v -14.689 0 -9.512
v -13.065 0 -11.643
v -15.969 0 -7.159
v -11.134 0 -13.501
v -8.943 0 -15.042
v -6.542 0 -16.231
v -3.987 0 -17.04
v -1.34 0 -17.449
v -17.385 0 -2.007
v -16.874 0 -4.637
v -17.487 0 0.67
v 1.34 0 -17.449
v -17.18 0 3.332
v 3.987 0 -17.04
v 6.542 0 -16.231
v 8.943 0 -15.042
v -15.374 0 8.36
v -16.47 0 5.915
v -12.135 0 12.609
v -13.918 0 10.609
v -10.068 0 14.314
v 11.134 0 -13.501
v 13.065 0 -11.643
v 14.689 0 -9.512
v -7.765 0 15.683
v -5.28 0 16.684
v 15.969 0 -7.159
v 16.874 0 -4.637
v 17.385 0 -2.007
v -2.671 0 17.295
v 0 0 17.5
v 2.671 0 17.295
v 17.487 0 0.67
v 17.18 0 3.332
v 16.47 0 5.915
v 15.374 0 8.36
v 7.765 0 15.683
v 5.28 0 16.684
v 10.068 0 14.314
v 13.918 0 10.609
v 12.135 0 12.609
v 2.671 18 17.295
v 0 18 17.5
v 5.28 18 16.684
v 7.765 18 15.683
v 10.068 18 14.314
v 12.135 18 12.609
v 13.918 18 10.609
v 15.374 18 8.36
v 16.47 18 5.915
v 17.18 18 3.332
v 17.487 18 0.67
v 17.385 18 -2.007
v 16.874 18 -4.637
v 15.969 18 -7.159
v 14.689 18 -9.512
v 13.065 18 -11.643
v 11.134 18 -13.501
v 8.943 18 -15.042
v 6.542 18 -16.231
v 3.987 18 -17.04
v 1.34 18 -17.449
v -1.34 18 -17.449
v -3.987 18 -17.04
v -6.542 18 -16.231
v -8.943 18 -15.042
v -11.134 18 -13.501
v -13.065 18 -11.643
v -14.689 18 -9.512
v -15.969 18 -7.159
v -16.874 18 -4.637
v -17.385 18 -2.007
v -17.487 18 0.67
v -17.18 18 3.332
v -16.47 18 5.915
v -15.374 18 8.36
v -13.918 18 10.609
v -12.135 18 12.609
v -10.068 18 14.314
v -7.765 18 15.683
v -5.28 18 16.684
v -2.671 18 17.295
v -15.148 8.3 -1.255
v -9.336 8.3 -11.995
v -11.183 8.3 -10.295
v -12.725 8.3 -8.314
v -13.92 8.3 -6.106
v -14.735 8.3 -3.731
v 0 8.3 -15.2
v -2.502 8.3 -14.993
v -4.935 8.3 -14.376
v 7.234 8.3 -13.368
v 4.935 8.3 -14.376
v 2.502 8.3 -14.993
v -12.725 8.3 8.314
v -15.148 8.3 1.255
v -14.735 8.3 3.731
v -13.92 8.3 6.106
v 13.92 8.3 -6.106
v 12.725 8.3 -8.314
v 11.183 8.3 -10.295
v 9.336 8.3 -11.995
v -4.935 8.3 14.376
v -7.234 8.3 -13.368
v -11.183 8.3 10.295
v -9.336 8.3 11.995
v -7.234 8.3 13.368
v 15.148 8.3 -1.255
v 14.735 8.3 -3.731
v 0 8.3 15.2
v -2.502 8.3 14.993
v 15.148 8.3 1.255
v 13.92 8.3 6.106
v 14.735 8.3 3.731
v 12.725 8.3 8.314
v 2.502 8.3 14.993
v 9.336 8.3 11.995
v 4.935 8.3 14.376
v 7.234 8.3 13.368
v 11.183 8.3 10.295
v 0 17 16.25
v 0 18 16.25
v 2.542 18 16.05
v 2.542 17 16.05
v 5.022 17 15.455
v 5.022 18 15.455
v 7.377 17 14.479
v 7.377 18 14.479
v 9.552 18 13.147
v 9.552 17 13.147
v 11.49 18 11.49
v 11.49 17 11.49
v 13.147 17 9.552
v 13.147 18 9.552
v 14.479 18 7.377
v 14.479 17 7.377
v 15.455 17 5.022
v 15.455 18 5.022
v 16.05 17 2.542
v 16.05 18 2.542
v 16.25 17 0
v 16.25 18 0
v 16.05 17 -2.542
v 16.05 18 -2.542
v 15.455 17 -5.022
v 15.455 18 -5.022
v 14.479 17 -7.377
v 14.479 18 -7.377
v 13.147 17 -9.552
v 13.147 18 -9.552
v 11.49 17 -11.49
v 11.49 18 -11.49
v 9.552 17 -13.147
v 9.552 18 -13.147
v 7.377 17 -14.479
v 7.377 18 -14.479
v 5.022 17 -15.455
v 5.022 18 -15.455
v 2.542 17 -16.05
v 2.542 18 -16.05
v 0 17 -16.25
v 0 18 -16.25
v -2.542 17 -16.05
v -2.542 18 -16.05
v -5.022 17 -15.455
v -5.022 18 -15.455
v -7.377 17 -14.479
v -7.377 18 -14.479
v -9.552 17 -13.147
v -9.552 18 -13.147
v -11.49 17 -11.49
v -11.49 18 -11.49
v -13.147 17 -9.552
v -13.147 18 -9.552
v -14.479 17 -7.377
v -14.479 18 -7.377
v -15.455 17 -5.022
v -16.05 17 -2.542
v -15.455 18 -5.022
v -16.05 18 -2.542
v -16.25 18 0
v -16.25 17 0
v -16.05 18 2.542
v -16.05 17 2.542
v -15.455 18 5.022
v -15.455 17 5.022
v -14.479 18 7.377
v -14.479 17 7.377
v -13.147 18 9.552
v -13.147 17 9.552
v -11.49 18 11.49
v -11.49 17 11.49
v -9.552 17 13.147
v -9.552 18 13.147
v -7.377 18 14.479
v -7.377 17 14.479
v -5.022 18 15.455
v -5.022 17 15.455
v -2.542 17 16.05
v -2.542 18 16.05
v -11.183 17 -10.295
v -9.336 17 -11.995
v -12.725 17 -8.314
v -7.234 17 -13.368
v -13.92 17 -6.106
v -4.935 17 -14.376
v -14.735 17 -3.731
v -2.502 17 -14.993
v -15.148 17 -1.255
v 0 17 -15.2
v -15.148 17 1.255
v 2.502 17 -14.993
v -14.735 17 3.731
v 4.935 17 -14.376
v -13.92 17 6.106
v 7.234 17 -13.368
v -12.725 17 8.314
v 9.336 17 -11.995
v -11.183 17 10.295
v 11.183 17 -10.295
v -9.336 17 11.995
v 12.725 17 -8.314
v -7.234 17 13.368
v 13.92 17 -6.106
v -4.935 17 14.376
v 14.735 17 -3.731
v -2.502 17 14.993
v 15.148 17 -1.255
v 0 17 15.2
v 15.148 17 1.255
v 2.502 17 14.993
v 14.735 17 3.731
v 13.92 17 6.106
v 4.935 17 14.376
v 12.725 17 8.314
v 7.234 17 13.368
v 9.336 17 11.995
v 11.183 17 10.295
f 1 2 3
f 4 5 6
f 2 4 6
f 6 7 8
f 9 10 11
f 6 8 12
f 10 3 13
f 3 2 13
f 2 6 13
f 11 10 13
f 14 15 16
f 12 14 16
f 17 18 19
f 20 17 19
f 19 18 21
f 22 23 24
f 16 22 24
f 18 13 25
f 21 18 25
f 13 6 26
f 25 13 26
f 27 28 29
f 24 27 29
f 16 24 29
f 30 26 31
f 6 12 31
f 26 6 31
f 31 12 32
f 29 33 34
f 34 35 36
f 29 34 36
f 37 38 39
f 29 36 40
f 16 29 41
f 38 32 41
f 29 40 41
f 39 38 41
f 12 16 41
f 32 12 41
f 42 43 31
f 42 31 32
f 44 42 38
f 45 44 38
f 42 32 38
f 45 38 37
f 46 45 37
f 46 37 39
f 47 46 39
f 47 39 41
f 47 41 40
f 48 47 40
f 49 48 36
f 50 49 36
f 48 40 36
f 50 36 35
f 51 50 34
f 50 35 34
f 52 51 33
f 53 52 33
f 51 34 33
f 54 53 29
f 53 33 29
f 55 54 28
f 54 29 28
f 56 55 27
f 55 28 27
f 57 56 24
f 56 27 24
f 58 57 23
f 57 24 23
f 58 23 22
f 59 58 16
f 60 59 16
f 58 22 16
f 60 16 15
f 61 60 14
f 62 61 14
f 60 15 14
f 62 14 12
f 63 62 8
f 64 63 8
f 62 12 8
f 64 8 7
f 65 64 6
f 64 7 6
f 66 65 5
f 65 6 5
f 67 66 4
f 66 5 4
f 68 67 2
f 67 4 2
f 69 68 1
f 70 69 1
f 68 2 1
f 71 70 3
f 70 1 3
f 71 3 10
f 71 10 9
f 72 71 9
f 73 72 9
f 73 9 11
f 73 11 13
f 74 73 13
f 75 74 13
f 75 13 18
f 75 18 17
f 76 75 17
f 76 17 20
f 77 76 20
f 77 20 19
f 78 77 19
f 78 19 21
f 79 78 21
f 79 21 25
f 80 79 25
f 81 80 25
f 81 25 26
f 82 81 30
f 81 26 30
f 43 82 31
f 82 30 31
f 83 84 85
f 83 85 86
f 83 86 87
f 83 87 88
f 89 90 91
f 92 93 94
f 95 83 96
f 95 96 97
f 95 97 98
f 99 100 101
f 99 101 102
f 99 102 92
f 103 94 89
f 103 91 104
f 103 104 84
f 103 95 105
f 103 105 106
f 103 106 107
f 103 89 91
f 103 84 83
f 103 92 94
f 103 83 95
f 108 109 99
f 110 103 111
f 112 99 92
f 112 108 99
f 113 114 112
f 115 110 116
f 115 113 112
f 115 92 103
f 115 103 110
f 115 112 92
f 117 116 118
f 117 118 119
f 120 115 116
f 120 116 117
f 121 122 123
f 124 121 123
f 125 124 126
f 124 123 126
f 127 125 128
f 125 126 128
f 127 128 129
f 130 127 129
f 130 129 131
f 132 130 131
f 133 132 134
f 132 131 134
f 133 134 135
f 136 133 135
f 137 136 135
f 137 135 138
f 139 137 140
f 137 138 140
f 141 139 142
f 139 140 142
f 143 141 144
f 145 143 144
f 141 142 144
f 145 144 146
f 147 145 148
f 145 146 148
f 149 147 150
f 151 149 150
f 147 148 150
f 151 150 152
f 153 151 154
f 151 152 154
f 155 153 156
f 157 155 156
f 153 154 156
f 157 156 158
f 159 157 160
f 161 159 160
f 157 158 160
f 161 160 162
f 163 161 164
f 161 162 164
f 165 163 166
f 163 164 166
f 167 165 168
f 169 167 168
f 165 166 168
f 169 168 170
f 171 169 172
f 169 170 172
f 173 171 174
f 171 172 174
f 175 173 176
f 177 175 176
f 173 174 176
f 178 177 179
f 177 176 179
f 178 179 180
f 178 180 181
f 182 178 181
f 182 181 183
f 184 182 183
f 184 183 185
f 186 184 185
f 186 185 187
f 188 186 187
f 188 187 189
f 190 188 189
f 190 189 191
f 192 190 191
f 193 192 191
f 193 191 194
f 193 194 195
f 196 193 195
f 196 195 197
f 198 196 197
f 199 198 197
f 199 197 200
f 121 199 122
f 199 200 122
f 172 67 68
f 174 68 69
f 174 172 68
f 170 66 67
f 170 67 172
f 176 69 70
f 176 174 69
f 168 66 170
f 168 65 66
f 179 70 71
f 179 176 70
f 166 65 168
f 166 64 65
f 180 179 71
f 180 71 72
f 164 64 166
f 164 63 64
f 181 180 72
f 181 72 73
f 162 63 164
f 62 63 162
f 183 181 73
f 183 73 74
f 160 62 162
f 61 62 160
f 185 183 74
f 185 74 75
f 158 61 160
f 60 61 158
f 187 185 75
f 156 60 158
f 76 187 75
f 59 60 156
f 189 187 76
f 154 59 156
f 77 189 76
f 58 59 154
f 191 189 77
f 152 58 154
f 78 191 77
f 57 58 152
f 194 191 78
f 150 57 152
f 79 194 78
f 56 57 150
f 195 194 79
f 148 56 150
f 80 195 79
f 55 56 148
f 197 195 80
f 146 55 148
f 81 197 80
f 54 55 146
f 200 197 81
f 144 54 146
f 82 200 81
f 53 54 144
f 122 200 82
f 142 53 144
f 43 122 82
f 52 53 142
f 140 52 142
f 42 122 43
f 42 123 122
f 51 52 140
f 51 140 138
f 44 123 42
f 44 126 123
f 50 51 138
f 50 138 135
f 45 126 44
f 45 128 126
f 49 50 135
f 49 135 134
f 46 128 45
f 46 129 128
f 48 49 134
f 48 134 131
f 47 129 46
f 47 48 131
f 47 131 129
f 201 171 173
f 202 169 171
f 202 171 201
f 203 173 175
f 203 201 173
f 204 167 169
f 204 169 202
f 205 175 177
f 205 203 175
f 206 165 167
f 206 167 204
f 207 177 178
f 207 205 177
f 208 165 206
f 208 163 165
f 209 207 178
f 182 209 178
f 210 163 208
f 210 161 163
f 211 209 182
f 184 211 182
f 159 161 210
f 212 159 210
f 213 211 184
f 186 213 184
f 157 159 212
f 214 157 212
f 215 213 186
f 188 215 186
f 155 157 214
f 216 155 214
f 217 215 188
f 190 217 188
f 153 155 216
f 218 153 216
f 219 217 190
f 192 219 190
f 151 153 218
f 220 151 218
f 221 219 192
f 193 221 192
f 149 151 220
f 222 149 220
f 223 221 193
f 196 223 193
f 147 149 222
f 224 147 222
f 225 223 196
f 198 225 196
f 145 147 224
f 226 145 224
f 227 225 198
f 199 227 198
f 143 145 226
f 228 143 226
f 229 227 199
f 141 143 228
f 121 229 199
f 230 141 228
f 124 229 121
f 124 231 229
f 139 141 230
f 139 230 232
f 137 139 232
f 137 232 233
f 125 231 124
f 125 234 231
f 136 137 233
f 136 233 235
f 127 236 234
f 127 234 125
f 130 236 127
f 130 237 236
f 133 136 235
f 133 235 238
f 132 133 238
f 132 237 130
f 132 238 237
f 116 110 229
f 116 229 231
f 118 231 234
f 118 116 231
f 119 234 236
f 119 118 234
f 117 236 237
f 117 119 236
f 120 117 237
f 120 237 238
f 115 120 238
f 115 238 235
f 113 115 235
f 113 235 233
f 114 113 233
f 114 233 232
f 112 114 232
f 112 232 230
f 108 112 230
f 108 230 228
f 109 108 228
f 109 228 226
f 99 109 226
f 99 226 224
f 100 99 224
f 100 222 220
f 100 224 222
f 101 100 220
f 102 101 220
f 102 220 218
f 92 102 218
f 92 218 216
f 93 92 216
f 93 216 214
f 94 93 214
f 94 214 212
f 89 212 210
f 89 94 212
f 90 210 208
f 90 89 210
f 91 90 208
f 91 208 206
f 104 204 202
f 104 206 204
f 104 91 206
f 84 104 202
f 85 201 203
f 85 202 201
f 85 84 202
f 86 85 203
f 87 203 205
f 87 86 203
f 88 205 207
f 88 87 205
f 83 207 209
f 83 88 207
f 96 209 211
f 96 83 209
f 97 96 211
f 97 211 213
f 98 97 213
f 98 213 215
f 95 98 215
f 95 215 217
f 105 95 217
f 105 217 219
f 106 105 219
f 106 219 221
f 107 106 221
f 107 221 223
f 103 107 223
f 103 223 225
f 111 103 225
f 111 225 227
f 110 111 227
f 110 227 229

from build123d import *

# Parameters (mm, degrees)
SKETCH1_R           = 17.5
BOSS_EXTRUDE1_DEPTH = 18
SHELL1_T            = -2.3
SKETCH2_R           = 16.25
CUT_EXTRUDE1_DEPTH  = 1
SKETCH4_R           = 15.2
BOSS_EXTRUDE2_DEPTH = 6


with BuildPart() as part:
    # Sketch1 → Boss-Extrude1 (new body)
    with BuildSketch(Plane(origin=(0, 0, 0), x_dir=(1, 0, 0), z_dir=(0, 1, 0))):
        with Locations(Location((0, 0, 0), (0, 0, 270))):
            Circle(SKETCH1_R)
    extrude(amount=BOSS_EXTRUDE1_DEPTH)

    # Shell1
    shell1_openings = [part.faces().sort_by_distance(p)[0] for p in [
        (0, 18, 0),
    ]]
    offset(amount=SHELL1_T, openings=shell1_openings, kind=Kind.INTERSECTION)

    # Sketch2 → Cut-Extrude1 (cut)
    with BuildSketch(Plane(origin=(0, 18, 0), x_dir=(1, 0, 0), z_dir=(0, 1, 0))):
        with Locations(Location((0, 0, 0), (0, 0, 270))):
            Circle(SKETCH2_R)
    extrude(amount=-CUT_EXTRUDE1_DEPTH, mode=Mode.SUBTRACT)

    # Sketch4 → Boss-Extrude2 (add)
    with BuildSketch(Plane(origin=(0, 2.3, 0), x_dir=(1, 0, 0), z_dir=(0, 1, 0))):
        with Locations(Location((0, 0, 0), (0, 0, 270))):
            Circle(SKETCH4_R)
    extrude(amount=BOSS_EXTRUDE2_DEPTH)


solid = part.part
